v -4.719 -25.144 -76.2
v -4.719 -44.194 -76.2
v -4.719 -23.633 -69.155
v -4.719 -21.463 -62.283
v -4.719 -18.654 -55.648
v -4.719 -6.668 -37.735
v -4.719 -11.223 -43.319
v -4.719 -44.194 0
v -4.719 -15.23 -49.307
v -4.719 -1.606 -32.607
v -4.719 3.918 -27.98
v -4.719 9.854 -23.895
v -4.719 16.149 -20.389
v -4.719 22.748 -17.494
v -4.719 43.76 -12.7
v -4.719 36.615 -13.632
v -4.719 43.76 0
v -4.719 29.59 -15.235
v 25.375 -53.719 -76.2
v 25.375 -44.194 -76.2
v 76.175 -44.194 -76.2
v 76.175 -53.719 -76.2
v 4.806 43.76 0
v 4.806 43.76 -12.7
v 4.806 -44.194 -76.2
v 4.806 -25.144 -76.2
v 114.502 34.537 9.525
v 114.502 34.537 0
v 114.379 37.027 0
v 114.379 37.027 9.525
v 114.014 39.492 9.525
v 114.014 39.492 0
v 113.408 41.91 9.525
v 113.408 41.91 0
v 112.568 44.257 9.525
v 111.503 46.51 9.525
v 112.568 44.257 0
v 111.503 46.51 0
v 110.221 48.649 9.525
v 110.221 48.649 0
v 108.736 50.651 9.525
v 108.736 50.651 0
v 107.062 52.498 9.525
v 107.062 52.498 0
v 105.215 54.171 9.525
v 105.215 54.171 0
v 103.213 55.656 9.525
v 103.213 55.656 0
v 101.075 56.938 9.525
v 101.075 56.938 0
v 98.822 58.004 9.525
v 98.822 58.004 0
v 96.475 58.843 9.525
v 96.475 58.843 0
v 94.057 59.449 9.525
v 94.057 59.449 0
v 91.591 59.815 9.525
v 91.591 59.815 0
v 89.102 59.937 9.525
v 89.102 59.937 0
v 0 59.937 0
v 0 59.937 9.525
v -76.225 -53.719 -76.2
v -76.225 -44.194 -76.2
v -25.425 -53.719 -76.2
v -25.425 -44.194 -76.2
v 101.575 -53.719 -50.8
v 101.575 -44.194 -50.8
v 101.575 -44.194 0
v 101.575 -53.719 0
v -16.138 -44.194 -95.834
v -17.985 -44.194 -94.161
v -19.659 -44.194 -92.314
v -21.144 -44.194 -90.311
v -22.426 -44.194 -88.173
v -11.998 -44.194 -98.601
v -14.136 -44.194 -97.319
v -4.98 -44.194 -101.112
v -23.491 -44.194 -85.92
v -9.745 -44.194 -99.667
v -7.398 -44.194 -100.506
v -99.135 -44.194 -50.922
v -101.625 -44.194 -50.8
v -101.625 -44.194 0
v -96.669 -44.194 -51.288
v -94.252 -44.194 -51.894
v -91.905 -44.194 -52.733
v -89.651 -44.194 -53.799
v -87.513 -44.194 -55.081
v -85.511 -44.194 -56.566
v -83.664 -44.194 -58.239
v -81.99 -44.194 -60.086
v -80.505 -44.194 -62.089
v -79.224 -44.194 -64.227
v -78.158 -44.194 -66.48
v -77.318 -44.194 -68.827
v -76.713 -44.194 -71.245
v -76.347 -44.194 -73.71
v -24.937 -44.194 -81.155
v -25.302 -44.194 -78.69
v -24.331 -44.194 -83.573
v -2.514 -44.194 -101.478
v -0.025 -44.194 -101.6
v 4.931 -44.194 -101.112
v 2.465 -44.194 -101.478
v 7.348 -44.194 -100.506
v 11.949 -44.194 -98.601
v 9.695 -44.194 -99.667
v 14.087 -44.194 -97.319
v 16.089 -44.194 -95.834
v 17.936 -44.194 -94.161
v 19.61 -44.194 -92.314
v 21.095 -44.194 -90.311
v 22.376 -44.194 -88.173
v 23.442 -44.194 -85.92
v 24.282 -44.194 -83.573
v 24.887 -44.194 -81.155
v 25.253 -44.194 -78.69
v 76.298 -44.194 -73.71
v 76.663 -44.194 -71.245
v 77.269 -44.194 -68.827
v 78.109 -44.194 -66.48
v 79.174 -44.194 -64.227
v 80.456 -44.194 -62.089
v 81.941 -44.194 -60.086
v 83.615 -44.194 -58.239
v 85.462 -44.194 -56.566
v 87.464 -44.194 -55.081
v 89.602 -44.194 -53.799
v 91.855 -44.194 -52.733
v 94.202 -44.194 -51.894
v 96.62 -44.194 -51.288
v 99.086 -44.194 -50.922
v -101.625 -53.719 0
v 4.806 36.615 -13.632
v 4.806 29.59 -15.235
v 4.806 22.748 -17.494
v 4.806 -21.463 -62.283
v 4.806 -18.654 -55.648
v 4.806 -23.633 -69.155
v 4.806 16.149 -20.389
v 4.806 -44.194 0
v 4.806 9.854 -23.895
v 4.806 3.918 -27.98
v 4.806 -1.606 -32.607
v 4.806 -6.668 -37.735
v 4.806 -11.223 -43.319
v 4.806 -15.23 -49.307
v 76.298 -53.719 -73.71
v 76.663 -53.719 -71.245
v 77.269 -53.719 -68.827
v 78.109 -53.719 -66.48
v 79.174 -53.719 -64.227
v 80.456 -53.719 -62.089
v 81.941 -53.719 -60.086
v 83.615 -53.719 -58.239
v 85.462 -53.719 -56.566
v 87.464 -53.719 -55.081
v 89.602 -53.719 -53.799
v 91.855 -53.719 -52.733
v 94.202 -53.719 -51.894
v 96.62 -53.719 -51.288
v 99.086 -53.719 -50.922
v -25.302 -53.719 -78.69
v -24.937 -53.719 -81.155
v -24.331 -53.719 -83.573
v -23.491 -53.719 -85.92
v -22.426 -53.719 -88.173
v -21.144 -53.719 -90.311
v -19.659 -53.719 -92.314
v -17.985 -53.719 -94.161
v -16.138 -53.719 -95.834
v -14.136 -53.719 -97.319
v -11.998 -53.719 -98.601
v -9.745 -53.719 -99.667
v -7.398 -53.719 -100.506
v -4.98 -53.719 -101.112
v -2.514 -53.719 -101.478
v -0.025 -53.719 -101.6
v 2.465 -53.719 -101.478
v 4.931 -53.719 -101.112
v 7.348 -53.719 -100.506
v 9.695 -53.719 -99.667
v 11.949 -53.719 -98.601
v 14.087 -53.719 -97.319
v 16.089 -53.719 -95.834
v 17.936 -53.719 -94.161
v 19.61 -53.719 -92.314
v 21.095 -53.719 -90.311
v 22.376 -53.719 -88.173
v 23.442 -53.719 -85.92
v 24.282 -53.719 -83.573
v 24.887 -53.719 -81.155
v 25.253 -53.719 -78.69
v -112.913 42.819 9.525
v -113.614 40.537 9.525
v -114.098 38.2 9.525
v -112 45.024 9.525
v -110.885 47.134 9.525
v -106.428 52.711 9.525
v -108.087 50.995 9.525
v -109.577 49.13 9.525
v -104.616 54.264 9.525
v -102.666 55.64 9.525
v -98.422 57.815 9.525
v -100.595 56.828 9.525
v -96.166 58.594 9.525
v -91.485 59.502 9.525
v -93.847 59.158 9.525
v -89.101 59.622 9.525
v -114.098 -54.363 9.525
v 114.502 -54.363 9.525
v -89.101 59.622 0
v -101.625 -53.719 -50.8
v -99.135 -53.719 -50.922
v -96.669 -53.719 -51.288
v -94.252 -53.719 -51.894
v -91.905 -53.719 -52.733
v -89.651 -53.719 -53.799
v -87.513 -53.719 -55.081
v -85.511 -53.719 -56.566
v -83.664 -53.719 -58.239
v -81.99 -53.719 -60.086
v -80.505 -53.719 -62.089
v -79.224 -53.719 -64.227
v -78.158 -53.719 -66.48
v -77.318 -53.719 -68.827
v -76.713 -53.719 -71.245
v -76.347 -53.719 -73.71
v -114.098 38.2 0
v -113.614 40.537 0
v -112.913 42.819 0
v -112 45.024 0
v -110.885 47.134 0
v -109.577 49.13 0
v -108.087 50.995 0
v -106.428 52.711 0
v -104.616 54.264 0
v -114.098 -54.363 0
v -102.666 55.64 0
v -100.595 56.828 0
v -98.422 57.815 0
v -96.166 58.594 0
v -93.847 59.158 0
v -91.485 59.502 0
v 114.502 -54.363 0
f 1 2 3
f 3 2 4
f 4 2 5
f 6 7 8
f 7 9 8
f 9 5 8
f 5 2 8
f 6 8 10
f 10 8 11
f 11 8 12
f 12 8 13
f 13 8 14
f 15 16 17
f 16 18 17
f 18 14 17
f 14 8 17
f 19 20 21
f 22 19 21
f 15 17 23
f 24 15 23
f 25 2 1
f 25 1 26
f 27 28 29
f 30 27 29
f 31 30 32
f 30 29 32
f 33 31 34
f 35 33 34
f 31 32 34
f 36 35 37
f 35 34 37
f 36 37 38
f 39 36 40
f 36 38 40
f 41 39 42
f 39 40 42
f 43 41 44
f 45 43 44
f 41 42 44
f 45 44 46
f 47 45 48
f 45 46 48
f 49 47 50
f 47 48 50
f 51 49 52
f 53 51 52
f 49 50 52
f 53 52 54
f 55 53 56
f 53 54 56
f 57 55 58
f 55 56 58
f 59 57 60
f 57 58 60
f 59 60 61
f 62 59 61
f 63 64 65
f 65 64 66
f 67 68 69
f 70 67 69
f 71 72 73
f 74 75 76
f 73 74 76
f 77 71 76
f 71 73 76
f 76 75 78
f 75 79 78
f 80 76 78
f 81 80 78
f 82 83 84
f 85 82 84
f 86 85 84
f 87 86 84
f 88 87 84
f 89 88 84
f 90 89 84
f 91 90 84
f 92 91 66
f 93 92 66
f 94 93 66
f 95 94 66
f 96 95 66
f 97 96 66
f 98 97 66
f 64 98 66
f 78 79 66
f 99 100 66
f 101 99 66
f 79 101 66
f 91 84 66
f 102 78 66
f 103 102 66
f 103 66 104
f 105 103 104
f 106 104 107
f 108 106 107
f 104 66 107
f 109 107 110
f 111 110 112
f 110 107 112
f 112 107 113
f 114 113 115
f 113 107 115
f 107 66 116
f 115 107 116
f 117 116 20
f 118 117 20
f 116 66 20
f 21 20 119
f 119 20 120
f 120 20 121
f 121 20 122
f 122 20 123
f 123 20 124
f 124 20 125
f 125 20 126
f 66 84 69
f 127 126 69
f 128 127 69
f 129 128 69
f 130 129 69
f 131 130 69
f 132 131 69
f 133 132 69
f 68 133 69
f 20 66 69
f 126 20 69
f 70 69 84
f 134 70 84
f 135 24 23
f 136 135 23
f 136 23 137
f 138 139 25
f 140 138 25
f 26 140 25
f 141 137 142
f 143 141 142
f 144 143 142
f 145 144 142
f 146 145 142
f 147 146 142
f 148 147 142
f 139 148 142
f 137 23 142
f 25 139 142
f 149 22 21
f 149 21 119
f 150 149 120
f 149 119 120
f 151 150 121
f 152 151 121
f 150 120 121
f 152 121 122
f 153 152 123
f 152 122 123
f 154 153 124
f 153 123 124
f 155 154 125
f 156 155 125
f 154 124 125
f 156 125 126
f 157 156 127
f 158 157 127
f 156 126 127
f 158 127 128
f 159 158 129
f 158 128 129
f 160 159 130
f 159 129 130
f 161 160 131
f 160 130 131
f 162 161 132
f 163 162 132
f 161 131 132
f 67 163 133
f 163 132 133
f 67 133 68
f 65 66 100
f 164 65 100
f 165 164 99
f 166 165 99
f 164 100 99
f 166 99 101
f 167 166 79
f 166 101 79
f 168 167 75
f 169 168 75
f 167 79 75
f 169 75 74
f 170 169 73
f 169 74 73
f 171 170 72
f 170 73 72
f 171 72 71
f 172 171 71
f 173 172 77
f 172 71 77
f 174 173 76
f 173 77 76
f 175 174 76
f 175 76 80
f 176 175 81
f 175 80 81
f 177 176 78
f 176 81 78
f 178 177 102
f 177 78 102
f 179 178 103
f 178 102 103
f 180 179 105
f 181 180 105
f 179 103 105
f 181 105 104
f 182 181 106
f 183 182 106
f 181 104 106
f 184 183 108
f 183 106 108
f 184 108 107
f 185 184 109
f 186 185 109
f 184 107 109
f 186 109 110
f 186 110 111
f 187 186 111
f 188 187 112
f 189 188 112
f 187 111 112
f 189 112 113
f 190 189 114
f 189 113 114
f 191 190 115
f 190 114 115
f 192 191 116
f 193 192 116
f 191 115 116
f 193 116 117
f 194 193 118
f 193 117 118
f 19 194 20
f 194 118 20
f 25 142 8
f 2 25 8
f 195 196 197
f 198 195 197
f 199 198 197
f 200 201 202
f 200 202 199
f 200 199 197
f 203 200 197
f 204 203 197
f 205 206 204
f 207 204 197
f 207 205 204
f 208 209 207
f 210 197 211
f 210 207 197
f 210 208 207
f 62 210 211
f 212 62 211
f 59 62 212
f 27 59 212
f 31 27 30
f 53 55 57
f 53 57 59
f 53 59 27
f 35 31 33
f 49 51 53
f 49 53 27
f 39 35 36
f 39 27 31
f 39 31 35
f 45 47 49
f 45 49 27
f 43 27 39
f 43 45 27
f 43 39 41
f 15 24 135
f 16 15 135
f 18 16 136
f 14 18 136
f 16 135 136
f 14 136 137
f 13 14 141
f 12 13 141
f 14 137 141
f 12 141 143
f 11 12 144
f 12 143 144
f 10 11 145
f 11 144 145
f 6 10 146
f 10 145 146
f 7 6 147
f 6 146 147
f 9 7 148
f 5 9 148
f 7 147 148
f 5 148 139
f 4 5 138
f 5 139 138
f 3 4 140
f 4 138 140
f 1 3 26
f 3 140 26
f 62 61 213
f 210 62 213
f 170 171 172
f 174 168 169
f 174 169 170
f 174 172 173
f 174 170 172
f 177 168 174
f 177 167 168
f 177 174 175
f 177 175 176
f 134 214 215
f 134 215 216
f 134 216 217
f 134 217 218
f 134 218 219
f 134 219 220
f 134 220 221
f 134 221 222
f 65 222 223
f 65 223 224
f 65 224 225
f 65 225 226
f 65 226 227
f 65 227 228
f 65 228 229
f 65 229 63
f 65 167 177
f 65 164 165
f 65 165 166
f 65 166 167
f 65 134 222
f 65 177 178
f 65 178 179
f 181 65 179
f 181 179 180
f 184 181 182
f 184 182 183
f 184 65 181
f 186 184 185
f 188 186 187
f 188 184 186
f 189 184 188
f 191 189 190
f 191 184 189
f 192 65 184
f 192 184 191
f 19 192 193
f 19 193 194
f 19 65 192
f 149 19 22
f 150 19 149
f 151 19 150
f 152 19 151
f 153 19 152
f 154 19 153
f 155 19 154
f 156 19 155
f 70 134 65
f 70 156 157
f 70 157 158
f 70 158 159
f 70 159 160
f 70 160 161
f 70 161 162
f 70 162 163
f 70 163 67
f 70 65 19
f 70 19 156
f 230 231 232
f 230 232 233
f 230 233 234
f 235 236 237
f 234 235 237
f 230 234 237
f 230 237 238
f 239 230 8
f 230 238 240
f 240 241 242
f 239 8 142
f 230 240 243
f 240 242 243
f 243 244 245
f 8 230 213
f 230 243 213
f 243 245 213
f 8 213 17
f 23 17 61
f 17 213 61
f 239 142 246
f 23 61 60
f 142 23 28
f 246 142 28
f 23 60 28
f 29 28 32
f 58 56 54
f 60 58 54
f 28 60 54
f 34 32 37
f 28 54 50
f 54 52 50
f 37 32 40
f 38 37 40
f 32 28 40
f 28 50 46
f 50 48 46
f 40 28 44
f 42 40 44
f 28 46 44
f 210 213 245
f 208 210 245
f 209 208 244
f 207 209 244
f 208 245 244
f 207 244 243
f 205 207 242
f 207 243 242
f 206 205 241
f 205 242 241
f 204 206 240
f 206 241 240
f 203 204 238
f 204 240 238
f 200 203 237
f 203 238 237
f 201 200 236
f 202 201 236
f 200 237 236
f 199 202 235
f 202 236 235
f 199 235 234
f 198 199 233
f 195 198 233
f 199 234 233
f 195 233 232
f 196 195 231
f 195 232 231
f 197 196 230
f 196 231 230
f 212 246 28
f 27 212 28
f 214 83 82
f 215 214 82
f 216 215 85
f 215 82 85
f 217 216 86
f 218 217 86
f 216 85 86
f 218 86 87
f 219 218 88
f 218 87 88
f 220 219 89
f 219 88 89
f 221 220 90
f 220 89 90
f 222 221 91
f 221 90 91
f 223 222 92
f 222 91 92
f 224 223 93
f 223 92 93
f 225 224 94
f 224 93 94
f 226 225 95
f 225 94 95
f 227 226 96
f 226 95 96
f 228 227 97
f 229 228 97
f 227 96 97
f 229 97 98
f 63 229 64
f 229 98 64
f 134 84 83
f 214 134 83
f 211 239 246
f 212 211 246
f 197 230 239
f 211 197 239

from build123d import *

# Parameters (mm, degrees)
F1_DEPTH = 9.525
F4_DEPTH = 76.2
F6_DEPTH = 9.525
F9_DEPTH = 25.4


# Not quite as in the source:
# - a feature of the source that left no trace in its solid (it failed there, or was rolled back) is left out


with BuildPart() as f1:
    # F0 (on Top) → F1 (new body)
    with BuildSketch(Plane.XY):
        with BuildLine():
            Line((0.2017877996, -54.3629787627), (0, 59.9370212373))
            Line((0, 59.9370212373), (-89.1012323912, 59.6224176037))
            ThreePointArc((-89.1012323912, 59.6224176037), (-105.5400958188, 53.5090257564), (-114.0982122004, 38.1999292884))
            Line((-114.0982122004, 38.1999292884), (-114.0982122004, -54.3629787627))
            Line((-114.0982122004, -54.3629787627), (0.2017877996, -54.3629787627))
        make_face()
        with BuildLine():
            Line((89.1017877996, 59.9370212373), (0, 59.9370212373))
            Line((0, 59.9370212373), (0.2017877996, -54.3629787627))
            Line((0.2017877996, -54.3629787627), (114.5017877996, -54.3629787627))
            Line((114.5017877996, -54.3629787627), (114.5017877996, 34.5370212373))
            ThreePointArc((114.5017877996, 34.5370212373), (107.0623000417, 52.4975334794), (89.1017877996, 59.9370212373))
        make_face()
    extrude(amount=F1_DEPTH)

    # F3 (on face) → F4 (join)
    with BuildSketch(Plane(origin=(0, 0, 0), x_dir=(1, 0, 0), z_dir=(0, 0, -1))):
        Polygon((4.8055368662, 44.1943933845), (0.0430368662, 44.1943933845), (0.0430368662, -43.7603956342), (4.8055368662, -43.7603956342), (4.8055368662, -34.2353956342), align=None)
        Polygon((0.0430368662, 44.1943933845), (-4.7194631338, 44.1943933845), (-4.7194631338, -34.2353956342), (-4.7194631338, -43.7603956342), (0.0430368662, -43.7603956342), align=None)
    extrude(amount=F4_DEPTH)

    # F8 (on face) → F9 (cut)
    with BuildSketch(Plane.YZ.offset(4.8055368662)):
        with BuildLine():
            Line((43.7603956342, -76.2), (43.7603956342, -12.7))
            ThreePointArc((43.7603956342, -12.7), (-1.6060003551, -32.6070556012), (-25.1443933845, -76.2))
            Line((-25.1443933845, -76.2), (43.7603956342, -76.2))
        make_face()
    extrude(amount=-F9_DEPTH, mode=Mode.SUBTRACT)


with BuildPart() as f6:
    # F5 (on face) → F6 (new body)
    with BuildSketch(Plane.XZ.offset(44.1943933845)):
        with BuildLine():
            Line((101.575226661, 0), (-101.624773339, 0))
            Line((-101.624773339, 0), (-101.624773339, -50.8))
            ThreePointArc((-101.624773339, -50.8), (-83.6642610969, -58.2394877579), (-76.224773339, -76.2))
            Line((-76.224773339, -76.2), (-25.424773339, -76.2))
            ThreePointArc((-25.424773339, -76.2), (-0.024773339, -101.6), (25.375226661, -76.2))
            Line((25.375226661, -76.2), (76.175226661, -76.2))
            ThreePointArc((76.175226661, -76.2), (83.6147144189, -58.2394877579), (101.575226661, -50.8))
            Line((101.575226661, -50.8), (101.575226661, 0))
        make_face()
    extrude(amount=F6_DEPTH)


solid = Compound([f1.part, f6.part])
